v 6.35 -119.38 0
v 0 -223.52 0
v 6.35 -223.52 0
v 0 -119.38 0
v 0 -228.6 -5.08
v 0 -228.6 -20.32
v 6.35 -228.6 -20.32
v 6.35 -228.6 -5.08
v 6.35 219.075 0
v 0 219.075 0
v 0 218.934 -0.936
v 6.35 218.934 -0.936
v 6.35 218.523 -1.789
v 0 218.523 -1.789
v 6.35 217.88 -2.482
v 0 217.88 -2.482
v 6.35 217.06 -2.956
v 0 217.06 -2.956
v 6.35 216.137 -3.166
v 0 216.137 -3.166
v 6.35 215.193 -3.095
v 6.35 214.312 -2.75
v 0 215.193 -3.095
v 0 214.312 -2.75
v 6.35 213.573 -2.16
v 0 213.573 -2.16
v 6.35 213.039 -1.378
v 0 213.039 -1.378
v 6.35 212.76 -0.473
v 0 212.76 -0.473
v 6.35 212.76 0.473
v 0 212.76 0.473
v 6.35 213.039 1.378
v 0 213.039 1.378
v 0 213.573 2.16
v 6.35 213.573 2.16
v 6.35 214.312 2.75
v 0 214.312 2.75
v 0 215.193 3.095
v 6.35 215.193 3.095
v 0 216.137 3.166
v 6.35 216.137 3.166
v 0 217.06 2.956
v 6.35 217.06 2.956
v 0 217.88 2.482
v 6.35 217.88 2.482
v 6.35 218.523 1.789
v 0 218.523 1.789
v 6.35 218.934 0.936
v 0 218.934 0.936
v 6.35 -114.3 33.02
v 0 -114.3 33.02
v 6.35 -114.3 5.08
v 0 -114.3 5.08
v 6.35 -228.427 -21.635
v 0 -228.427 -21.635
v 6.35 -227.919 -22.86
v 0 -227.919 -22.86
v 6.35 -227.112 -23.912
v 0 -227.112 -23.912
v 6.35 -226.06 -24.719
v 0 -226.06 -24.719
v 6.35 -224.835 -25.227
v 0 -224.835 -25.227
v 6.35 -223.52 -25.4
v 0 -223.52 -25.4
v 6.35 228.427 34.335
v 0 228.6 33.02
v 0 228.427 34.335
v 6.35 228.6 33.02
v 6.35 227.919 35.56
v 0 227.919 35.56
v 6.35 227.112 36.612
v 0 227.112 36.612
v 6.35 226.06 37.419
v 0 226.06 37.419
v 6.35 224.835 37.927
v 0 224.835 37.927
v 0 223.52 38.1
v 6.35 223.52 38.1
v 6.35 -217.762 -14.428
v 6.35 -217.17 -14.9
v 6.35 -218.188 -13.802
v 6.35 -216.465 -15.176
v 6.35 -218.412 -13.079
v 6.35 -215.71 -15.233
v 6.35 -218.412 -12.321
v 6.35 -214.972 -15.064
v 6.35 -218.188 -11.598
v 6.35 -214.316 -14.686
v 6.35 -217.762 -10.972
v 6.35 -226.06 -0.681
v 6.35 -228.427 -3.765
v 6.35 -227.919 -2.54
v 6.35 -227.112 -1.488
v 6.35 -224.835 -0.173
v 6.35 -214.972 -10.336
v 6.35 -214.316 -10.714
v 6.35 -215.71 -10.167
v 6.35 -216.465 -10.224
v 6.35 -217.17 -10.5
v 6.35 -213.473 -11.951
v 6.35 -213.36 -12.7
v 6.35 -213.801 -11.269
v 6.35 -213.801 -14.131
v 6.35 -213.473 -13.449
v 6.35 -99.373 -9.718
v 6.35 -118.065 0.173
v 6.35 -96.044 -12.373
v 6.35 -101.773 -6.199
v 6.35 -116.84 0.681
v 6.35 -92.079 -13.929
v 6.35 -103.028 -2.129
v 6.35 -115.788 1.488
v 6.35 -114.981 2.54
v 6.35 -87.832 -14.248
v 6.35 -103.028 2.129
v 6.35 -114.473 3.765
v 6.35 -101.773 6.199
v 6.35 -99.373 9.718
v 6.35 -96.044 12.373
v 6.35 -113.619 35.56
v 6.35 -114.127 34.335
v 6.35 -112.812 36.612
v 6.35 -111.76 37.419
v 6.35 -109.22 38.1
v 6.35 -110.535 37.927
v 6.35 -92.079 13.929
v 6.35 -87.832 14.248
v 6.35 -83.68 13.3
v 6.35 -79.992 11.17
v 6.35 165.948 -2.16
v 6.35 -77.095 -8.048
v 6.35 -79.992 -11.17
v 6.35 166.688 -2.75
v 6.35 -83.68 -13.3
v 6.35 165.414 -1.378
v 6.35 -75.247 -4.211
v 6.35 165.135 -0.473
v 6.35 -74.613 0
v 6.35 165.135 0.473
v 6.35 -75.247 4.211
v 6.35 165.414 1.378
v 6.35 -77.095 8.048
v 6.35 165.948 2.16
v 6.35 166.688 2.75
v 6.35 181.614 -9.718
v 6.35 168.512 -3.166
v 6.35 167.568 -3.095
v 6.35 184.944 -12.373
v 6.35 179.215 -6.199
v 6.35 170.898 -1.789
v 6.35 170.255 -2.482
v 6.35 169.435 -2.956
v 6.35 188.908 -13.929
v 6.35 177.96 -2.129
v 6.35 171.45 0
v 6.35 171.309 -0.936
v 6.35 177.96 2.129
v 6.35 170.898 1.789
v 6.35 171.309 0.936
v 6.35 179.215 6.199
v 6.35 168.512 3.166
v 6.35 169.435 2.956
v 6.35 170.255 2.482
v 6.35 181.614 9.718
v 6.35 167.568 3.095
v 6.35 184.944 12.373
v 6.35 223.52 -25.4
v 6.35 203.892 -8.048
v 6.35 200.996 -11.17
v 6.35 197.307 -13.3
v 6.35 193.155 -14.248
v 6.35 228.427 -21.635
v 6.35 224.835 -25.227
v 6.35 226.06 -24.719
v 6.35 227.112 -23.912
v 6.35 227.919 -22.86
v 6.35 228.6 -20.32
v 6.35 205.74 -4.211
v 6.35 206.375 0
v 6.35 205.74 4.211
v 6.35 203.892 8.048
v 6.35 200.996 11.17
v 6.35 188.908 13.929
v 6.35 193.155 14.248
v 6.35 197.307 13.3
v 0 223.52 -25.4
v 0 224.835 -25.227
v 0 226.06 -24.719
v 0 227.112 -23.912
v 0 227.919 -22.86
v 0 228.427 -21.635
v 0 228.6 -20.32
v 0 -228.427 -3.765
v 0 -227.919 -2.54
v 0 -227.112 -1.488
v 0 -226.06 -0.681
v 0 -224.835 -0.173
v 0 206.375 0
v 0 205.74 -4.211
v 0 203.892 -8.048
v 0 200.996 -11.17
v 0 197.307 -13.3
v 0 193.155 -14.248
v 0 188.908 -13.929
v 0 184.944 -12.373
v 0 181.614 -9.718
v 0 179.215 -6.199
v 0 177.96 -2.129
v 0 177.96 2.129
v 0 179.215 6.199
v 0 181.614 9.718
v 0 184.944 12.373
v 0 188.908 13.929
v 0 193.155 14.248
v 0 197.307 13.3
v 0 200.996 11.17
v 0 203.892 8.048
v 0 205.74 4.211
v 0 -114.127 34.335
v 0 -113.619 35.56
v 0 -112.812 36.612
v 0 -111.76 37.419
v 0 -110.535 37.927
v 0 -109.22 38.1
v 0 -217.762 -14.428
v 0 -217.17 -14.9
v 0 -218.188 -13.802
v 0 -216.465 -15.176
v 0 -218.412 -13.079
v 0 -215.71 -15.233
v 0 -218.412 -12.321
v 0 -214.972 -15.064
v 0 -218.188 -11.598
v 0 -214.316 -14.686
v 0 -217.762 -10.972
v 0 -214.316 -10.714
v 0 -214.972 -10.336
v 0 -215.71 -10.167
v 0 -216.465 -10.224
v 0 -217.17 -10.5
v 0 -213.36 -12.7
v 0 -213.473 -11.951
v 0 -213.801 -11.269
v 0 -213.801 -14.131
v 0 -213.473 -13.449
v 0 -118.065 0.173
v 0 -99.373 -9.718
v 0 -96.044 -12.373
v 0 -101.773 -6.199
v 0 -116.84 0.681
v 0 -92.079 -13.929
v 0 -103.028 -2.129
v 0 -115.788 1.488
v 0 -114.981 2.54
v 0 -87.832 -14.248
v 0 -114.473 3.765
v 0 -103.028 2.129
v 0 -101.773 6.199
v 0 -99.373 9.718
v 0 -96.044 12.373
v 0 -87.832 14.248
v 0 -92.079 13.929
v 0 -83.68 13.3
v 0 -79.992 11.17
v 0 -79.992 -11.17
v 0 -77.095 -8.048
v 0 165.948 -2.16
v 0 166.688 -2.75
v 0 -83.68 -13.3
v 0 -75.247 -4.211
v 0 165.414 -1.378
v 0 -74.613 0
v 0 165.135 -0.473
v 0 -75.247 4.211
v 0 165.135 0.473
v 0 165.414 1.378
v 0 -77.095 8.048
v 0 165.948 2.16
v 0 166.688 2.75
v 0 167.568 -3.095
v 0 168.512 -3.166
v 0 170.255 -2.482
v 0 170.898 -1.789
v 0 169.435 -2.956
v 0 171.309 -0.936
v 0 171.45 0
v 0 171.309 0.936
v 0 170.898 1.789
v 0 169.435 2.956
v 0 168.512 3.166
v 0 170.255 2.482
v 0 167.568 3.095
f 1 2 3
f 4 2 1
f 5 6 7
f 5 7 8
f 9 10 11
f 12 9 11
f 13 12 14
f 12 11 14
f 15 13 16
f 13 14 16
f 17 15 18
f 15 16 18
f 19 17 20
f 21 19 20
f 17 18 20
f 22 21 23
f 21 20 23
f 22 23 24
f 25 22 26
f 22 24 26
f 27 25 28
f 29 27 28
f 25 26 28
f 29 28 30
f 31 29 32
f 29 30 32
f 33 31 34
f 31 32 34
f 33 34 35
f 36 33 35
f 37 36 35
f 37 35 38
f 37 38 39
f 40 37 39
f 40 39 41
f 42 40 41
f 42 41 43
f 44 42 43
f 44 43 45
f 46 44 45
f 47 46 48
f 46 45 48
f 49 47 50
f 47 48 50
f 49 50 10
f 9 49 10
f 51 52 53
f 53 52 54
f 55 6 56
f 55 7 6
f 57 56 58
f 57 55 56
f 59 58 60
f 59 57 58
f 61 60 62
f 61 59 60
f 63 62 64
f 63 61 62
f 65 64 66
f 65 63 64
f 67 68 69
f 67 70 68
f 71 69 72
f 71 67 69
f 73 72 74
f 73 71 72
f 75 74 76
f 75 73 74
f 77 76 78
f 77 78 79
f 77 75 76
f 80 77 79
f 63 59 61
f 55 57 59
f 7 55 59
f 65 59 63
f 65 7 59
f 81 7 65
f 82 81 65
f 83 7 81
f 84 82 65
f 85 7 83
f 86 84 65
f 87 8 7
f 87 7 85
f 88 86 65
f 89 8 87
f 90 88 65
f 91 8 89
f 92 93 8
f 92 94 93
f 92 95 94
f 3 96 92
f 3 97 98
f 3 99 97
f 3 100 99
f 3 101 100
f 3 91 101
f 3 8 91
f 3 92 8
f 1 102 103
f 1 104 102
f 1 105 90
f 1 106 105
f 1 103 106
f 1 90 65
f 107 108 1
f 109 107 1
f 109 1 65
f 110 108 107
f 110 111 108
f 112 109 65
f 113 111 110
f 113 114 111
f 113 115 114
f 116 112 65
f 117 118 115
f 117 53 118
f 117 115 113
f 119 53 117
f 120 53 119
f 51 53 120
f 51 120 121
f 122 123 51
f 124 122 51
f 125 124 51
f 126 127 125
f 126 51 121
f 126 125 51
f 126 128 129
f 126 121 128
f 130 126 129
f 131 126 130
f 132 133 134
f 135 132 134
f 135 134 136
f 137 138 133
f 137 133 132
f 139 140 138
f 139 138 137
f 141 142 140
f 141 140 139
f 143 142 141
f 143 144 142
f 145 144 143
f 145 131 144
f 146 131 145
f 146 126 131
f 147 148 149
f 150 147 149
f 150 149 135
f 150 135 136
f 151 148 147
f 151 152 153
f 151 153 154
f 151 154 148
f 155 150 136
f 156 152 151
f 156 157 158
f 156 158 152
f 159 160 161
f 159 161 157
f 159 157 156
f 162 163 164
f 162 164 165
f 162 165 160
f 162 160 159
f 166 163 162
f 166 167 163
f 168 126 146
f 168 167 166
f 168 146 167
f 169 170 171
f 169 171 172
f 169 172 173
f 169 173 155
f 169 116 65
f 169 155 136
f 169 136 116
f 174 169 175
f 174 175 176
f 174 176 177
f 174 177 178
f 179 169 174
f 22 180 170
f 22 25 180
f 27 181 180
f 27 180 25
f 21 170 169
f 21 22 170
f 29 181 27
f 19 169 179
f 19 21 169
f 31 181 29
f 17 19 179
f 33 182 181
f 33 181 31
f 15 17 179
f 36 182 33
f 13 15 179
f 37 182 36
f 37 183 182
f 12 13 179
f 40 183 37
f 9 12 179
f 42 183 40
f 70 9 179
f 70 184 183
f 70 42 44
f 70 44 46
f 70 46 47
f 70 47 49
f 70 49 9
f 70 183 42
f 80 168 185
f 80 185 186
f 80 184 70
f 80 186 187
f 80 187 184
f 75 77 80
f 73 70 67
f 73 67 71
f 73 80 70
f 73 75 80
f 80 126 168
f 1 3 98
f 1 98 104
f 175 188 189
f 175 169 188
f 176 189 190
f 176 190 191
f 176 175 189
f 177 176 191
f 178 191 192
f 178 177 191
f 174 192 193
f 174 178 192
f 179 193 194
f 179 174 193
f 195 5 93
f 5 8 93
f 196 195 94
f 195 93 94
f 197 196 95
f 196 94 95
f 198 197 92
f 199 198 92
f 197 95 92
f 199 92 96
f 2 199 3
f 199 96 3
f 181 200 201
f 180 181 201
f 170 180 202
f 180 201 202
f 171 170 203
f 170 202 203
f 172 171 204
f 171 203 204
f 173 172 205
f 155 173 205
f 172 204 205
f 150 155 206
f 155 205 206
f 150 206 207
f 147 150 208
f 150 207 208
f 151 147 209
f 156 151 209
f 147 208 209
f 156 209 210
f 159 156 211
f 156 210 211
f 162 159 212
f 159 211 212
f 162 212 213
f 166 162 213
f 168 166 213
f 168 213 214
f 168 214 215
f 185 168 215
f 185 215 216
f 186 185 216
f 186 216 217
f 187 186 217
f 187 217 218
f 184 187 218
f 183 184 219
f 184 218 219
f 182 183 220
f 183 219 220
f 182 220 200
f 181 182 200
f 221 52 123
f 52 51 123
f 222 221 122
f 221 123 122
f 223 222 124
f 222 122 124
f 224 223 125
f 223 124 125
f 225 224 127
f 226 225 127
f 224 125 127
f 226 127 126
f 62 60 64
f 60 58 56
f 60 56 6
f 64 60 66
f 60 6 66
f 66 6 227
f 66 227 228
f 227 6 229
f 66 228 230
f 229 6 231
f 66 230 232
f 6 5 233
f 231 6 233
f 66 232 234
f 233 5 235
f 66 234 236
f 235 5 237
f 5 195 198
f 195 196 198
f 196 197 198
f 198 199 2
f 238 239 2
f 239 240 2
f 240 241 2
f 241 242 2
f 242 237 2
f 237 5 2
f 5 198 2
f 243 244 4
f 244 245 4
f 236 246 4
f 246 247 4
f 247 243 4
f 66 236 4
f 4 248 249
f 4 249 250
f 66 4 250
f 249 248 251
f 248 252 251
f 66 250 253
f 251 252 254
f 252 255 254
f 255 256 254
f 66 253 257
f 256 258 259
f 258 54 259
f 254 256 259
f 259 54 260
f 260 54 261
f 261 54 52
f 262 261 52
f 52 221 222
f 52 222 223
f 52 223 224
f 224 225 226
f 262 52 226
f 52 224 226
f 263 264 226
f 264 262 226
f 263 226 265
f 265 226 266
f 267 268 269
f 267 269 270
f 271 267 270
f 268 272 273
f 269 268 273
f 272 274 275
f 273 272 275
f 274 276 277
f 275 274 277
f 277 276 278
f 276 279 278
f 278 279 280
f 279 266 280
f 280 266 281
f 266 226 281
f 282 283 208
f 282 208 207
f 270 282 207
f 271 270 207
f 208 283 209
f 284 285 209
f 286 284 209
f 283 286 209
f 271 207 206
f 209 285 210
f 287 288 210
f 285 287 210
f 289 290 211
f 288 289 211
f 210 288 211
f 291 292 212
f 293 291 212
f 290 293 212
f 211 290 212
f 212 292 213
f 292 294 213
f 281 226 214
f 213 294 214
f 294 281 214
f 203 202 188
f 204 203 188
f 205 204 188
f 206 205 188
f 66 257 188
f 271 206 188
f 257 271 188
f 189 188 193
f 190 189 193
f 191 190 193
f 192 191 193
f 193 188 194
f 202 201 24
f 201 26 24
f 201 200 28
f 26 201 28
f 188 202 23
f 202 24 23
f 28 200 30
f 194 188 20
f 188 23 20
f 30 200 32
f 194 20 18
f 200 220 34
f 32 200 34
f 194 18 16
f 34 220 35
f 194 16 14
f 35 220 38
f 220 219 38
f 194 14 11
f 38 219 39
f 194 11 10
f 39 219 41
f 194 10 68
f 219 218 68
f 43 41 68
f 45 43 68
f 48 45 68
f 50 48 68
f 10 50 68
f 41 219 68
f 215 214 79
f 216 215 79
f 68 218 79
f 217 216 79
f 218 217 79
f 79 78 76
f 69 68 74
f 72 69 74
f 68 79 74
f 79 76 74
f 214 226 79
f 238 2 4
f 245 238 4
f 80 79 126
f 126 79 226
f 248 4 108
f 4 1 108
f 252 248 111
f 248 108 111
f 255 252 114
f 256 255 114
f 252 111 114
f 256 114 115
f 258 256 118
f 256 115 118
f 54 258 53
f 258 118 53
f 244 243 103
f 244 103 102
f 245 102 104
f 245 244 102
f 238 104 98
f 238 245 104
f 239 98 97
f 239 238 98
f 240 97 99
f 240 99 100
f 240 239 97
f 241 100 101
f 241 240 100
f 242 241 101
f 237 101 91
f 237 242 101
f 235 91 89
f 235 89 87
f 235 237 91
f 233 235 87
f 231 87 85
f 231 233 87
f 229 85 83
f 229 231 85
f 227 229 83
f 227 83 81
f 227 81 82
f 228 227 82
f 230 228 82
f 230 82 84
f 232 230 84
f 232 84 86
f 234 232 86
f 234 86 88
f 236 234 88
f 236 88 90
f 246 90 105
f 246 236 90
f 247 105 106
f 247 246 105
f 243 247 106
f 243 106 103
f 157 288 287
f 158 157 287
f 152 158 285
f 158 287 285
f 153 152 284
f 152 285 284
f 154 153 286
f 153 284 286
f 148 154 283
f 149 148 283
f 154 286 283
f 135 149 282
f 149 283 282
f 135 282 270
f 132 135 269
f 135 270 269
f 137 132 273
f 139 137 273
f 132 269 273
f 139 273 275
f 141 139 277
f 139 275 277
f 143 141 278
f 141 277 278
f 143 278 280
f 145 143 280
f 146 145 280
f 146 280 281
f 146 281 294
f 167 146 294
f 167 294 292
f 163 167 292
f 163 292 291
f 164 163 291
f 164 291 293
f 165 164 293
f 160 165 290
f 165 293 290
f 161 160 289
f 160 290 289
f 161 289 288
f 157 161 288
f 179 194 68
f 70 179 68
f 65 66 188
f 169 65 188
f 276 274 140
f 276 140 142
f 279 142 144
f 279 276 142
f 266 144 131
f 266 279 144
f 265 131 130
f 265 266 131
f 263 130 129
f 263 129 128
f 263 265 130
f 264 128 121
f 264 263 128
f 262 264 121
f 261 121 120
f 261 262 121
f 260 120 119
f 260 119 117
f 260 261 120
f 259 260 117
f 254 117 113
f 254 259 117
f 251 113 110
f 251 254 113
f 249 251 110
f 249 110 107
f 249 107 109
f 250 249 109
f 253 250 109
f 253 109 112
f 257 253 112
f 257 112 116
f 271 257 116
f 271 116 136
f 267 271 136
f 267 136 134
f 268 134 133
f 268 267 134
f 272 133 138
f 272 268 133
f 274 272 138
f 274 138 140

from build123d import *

# Parameters (mm, degrees)
F0_W     = 114.3
F0_H     = 25.4
F0_R     = 2.54
F0_R_2   = 14.2875
F1_DEPTH = 6.35
F2_R     = 5.08


with BuildPart() as f1:
    # F0 (on Right) → F1 (new body)
    with BuildSketch(Plane.YZ):
        with Locations((-171.45, -12.7)):
            Rectangle(F0_W, F0_H)
        with Locations((-215.9, -12.7)):
            Circle(F0_R, mode=Mode.SUBTRACT)
        Polygon((228.6, 38.1), (-114.3, 38.1), (-114.3, 0), (-114.3, -25.4), (228.6, -25.4), (228.6, 0), align=None)
        with Locations((-88.9, 0)):
            Circle(F0_R_2, mode=Mode.SUBTRACT)
        with BuildLine():
            ThreePointArc((165.1, 0), (168.275, 3.175), (171.45, 0))
            ThreePointArc((171.45, 0), (168.275, -3.175), (165.1, 0))
        make_face(mode=Mode.SUBTRACT)
        with BuildLine():
            ThreePointArc((177.8, 0), (192.0875, 14.2875), (206.375, 0))
            ThreePointArc((206.375, 0), (192.0875, -14.2875), (177.8, 0))
        make_face(mode=Mode.SUBTRACT)
        with BuildLine():
            ThreePointArc((212.725, 0), (215.9, 3.175), (219.075, 0))
            ThreePointArc((219.075, 0), (215.9, -3.175), (212.725, 0))
        make_face(mode=Mode.SUBTRACT)
    extrude(amount=F1_DEPTH)

    # F2
    f2_edges = [f1.edges().sort_by_distance(p)[0] for p in [
        (3.175, -114.3, 0),
        (3.175, -114.3, 38.1),
        (3.175, -228.6, 0),
        (3.175, -228.6, -25.4),
        (3.175, 228.6, 38.1),
        (3.175, 228.6, -25.4),
    ]]
    fillet(f2_edges, radius=F2_R)


solid = f1.part
